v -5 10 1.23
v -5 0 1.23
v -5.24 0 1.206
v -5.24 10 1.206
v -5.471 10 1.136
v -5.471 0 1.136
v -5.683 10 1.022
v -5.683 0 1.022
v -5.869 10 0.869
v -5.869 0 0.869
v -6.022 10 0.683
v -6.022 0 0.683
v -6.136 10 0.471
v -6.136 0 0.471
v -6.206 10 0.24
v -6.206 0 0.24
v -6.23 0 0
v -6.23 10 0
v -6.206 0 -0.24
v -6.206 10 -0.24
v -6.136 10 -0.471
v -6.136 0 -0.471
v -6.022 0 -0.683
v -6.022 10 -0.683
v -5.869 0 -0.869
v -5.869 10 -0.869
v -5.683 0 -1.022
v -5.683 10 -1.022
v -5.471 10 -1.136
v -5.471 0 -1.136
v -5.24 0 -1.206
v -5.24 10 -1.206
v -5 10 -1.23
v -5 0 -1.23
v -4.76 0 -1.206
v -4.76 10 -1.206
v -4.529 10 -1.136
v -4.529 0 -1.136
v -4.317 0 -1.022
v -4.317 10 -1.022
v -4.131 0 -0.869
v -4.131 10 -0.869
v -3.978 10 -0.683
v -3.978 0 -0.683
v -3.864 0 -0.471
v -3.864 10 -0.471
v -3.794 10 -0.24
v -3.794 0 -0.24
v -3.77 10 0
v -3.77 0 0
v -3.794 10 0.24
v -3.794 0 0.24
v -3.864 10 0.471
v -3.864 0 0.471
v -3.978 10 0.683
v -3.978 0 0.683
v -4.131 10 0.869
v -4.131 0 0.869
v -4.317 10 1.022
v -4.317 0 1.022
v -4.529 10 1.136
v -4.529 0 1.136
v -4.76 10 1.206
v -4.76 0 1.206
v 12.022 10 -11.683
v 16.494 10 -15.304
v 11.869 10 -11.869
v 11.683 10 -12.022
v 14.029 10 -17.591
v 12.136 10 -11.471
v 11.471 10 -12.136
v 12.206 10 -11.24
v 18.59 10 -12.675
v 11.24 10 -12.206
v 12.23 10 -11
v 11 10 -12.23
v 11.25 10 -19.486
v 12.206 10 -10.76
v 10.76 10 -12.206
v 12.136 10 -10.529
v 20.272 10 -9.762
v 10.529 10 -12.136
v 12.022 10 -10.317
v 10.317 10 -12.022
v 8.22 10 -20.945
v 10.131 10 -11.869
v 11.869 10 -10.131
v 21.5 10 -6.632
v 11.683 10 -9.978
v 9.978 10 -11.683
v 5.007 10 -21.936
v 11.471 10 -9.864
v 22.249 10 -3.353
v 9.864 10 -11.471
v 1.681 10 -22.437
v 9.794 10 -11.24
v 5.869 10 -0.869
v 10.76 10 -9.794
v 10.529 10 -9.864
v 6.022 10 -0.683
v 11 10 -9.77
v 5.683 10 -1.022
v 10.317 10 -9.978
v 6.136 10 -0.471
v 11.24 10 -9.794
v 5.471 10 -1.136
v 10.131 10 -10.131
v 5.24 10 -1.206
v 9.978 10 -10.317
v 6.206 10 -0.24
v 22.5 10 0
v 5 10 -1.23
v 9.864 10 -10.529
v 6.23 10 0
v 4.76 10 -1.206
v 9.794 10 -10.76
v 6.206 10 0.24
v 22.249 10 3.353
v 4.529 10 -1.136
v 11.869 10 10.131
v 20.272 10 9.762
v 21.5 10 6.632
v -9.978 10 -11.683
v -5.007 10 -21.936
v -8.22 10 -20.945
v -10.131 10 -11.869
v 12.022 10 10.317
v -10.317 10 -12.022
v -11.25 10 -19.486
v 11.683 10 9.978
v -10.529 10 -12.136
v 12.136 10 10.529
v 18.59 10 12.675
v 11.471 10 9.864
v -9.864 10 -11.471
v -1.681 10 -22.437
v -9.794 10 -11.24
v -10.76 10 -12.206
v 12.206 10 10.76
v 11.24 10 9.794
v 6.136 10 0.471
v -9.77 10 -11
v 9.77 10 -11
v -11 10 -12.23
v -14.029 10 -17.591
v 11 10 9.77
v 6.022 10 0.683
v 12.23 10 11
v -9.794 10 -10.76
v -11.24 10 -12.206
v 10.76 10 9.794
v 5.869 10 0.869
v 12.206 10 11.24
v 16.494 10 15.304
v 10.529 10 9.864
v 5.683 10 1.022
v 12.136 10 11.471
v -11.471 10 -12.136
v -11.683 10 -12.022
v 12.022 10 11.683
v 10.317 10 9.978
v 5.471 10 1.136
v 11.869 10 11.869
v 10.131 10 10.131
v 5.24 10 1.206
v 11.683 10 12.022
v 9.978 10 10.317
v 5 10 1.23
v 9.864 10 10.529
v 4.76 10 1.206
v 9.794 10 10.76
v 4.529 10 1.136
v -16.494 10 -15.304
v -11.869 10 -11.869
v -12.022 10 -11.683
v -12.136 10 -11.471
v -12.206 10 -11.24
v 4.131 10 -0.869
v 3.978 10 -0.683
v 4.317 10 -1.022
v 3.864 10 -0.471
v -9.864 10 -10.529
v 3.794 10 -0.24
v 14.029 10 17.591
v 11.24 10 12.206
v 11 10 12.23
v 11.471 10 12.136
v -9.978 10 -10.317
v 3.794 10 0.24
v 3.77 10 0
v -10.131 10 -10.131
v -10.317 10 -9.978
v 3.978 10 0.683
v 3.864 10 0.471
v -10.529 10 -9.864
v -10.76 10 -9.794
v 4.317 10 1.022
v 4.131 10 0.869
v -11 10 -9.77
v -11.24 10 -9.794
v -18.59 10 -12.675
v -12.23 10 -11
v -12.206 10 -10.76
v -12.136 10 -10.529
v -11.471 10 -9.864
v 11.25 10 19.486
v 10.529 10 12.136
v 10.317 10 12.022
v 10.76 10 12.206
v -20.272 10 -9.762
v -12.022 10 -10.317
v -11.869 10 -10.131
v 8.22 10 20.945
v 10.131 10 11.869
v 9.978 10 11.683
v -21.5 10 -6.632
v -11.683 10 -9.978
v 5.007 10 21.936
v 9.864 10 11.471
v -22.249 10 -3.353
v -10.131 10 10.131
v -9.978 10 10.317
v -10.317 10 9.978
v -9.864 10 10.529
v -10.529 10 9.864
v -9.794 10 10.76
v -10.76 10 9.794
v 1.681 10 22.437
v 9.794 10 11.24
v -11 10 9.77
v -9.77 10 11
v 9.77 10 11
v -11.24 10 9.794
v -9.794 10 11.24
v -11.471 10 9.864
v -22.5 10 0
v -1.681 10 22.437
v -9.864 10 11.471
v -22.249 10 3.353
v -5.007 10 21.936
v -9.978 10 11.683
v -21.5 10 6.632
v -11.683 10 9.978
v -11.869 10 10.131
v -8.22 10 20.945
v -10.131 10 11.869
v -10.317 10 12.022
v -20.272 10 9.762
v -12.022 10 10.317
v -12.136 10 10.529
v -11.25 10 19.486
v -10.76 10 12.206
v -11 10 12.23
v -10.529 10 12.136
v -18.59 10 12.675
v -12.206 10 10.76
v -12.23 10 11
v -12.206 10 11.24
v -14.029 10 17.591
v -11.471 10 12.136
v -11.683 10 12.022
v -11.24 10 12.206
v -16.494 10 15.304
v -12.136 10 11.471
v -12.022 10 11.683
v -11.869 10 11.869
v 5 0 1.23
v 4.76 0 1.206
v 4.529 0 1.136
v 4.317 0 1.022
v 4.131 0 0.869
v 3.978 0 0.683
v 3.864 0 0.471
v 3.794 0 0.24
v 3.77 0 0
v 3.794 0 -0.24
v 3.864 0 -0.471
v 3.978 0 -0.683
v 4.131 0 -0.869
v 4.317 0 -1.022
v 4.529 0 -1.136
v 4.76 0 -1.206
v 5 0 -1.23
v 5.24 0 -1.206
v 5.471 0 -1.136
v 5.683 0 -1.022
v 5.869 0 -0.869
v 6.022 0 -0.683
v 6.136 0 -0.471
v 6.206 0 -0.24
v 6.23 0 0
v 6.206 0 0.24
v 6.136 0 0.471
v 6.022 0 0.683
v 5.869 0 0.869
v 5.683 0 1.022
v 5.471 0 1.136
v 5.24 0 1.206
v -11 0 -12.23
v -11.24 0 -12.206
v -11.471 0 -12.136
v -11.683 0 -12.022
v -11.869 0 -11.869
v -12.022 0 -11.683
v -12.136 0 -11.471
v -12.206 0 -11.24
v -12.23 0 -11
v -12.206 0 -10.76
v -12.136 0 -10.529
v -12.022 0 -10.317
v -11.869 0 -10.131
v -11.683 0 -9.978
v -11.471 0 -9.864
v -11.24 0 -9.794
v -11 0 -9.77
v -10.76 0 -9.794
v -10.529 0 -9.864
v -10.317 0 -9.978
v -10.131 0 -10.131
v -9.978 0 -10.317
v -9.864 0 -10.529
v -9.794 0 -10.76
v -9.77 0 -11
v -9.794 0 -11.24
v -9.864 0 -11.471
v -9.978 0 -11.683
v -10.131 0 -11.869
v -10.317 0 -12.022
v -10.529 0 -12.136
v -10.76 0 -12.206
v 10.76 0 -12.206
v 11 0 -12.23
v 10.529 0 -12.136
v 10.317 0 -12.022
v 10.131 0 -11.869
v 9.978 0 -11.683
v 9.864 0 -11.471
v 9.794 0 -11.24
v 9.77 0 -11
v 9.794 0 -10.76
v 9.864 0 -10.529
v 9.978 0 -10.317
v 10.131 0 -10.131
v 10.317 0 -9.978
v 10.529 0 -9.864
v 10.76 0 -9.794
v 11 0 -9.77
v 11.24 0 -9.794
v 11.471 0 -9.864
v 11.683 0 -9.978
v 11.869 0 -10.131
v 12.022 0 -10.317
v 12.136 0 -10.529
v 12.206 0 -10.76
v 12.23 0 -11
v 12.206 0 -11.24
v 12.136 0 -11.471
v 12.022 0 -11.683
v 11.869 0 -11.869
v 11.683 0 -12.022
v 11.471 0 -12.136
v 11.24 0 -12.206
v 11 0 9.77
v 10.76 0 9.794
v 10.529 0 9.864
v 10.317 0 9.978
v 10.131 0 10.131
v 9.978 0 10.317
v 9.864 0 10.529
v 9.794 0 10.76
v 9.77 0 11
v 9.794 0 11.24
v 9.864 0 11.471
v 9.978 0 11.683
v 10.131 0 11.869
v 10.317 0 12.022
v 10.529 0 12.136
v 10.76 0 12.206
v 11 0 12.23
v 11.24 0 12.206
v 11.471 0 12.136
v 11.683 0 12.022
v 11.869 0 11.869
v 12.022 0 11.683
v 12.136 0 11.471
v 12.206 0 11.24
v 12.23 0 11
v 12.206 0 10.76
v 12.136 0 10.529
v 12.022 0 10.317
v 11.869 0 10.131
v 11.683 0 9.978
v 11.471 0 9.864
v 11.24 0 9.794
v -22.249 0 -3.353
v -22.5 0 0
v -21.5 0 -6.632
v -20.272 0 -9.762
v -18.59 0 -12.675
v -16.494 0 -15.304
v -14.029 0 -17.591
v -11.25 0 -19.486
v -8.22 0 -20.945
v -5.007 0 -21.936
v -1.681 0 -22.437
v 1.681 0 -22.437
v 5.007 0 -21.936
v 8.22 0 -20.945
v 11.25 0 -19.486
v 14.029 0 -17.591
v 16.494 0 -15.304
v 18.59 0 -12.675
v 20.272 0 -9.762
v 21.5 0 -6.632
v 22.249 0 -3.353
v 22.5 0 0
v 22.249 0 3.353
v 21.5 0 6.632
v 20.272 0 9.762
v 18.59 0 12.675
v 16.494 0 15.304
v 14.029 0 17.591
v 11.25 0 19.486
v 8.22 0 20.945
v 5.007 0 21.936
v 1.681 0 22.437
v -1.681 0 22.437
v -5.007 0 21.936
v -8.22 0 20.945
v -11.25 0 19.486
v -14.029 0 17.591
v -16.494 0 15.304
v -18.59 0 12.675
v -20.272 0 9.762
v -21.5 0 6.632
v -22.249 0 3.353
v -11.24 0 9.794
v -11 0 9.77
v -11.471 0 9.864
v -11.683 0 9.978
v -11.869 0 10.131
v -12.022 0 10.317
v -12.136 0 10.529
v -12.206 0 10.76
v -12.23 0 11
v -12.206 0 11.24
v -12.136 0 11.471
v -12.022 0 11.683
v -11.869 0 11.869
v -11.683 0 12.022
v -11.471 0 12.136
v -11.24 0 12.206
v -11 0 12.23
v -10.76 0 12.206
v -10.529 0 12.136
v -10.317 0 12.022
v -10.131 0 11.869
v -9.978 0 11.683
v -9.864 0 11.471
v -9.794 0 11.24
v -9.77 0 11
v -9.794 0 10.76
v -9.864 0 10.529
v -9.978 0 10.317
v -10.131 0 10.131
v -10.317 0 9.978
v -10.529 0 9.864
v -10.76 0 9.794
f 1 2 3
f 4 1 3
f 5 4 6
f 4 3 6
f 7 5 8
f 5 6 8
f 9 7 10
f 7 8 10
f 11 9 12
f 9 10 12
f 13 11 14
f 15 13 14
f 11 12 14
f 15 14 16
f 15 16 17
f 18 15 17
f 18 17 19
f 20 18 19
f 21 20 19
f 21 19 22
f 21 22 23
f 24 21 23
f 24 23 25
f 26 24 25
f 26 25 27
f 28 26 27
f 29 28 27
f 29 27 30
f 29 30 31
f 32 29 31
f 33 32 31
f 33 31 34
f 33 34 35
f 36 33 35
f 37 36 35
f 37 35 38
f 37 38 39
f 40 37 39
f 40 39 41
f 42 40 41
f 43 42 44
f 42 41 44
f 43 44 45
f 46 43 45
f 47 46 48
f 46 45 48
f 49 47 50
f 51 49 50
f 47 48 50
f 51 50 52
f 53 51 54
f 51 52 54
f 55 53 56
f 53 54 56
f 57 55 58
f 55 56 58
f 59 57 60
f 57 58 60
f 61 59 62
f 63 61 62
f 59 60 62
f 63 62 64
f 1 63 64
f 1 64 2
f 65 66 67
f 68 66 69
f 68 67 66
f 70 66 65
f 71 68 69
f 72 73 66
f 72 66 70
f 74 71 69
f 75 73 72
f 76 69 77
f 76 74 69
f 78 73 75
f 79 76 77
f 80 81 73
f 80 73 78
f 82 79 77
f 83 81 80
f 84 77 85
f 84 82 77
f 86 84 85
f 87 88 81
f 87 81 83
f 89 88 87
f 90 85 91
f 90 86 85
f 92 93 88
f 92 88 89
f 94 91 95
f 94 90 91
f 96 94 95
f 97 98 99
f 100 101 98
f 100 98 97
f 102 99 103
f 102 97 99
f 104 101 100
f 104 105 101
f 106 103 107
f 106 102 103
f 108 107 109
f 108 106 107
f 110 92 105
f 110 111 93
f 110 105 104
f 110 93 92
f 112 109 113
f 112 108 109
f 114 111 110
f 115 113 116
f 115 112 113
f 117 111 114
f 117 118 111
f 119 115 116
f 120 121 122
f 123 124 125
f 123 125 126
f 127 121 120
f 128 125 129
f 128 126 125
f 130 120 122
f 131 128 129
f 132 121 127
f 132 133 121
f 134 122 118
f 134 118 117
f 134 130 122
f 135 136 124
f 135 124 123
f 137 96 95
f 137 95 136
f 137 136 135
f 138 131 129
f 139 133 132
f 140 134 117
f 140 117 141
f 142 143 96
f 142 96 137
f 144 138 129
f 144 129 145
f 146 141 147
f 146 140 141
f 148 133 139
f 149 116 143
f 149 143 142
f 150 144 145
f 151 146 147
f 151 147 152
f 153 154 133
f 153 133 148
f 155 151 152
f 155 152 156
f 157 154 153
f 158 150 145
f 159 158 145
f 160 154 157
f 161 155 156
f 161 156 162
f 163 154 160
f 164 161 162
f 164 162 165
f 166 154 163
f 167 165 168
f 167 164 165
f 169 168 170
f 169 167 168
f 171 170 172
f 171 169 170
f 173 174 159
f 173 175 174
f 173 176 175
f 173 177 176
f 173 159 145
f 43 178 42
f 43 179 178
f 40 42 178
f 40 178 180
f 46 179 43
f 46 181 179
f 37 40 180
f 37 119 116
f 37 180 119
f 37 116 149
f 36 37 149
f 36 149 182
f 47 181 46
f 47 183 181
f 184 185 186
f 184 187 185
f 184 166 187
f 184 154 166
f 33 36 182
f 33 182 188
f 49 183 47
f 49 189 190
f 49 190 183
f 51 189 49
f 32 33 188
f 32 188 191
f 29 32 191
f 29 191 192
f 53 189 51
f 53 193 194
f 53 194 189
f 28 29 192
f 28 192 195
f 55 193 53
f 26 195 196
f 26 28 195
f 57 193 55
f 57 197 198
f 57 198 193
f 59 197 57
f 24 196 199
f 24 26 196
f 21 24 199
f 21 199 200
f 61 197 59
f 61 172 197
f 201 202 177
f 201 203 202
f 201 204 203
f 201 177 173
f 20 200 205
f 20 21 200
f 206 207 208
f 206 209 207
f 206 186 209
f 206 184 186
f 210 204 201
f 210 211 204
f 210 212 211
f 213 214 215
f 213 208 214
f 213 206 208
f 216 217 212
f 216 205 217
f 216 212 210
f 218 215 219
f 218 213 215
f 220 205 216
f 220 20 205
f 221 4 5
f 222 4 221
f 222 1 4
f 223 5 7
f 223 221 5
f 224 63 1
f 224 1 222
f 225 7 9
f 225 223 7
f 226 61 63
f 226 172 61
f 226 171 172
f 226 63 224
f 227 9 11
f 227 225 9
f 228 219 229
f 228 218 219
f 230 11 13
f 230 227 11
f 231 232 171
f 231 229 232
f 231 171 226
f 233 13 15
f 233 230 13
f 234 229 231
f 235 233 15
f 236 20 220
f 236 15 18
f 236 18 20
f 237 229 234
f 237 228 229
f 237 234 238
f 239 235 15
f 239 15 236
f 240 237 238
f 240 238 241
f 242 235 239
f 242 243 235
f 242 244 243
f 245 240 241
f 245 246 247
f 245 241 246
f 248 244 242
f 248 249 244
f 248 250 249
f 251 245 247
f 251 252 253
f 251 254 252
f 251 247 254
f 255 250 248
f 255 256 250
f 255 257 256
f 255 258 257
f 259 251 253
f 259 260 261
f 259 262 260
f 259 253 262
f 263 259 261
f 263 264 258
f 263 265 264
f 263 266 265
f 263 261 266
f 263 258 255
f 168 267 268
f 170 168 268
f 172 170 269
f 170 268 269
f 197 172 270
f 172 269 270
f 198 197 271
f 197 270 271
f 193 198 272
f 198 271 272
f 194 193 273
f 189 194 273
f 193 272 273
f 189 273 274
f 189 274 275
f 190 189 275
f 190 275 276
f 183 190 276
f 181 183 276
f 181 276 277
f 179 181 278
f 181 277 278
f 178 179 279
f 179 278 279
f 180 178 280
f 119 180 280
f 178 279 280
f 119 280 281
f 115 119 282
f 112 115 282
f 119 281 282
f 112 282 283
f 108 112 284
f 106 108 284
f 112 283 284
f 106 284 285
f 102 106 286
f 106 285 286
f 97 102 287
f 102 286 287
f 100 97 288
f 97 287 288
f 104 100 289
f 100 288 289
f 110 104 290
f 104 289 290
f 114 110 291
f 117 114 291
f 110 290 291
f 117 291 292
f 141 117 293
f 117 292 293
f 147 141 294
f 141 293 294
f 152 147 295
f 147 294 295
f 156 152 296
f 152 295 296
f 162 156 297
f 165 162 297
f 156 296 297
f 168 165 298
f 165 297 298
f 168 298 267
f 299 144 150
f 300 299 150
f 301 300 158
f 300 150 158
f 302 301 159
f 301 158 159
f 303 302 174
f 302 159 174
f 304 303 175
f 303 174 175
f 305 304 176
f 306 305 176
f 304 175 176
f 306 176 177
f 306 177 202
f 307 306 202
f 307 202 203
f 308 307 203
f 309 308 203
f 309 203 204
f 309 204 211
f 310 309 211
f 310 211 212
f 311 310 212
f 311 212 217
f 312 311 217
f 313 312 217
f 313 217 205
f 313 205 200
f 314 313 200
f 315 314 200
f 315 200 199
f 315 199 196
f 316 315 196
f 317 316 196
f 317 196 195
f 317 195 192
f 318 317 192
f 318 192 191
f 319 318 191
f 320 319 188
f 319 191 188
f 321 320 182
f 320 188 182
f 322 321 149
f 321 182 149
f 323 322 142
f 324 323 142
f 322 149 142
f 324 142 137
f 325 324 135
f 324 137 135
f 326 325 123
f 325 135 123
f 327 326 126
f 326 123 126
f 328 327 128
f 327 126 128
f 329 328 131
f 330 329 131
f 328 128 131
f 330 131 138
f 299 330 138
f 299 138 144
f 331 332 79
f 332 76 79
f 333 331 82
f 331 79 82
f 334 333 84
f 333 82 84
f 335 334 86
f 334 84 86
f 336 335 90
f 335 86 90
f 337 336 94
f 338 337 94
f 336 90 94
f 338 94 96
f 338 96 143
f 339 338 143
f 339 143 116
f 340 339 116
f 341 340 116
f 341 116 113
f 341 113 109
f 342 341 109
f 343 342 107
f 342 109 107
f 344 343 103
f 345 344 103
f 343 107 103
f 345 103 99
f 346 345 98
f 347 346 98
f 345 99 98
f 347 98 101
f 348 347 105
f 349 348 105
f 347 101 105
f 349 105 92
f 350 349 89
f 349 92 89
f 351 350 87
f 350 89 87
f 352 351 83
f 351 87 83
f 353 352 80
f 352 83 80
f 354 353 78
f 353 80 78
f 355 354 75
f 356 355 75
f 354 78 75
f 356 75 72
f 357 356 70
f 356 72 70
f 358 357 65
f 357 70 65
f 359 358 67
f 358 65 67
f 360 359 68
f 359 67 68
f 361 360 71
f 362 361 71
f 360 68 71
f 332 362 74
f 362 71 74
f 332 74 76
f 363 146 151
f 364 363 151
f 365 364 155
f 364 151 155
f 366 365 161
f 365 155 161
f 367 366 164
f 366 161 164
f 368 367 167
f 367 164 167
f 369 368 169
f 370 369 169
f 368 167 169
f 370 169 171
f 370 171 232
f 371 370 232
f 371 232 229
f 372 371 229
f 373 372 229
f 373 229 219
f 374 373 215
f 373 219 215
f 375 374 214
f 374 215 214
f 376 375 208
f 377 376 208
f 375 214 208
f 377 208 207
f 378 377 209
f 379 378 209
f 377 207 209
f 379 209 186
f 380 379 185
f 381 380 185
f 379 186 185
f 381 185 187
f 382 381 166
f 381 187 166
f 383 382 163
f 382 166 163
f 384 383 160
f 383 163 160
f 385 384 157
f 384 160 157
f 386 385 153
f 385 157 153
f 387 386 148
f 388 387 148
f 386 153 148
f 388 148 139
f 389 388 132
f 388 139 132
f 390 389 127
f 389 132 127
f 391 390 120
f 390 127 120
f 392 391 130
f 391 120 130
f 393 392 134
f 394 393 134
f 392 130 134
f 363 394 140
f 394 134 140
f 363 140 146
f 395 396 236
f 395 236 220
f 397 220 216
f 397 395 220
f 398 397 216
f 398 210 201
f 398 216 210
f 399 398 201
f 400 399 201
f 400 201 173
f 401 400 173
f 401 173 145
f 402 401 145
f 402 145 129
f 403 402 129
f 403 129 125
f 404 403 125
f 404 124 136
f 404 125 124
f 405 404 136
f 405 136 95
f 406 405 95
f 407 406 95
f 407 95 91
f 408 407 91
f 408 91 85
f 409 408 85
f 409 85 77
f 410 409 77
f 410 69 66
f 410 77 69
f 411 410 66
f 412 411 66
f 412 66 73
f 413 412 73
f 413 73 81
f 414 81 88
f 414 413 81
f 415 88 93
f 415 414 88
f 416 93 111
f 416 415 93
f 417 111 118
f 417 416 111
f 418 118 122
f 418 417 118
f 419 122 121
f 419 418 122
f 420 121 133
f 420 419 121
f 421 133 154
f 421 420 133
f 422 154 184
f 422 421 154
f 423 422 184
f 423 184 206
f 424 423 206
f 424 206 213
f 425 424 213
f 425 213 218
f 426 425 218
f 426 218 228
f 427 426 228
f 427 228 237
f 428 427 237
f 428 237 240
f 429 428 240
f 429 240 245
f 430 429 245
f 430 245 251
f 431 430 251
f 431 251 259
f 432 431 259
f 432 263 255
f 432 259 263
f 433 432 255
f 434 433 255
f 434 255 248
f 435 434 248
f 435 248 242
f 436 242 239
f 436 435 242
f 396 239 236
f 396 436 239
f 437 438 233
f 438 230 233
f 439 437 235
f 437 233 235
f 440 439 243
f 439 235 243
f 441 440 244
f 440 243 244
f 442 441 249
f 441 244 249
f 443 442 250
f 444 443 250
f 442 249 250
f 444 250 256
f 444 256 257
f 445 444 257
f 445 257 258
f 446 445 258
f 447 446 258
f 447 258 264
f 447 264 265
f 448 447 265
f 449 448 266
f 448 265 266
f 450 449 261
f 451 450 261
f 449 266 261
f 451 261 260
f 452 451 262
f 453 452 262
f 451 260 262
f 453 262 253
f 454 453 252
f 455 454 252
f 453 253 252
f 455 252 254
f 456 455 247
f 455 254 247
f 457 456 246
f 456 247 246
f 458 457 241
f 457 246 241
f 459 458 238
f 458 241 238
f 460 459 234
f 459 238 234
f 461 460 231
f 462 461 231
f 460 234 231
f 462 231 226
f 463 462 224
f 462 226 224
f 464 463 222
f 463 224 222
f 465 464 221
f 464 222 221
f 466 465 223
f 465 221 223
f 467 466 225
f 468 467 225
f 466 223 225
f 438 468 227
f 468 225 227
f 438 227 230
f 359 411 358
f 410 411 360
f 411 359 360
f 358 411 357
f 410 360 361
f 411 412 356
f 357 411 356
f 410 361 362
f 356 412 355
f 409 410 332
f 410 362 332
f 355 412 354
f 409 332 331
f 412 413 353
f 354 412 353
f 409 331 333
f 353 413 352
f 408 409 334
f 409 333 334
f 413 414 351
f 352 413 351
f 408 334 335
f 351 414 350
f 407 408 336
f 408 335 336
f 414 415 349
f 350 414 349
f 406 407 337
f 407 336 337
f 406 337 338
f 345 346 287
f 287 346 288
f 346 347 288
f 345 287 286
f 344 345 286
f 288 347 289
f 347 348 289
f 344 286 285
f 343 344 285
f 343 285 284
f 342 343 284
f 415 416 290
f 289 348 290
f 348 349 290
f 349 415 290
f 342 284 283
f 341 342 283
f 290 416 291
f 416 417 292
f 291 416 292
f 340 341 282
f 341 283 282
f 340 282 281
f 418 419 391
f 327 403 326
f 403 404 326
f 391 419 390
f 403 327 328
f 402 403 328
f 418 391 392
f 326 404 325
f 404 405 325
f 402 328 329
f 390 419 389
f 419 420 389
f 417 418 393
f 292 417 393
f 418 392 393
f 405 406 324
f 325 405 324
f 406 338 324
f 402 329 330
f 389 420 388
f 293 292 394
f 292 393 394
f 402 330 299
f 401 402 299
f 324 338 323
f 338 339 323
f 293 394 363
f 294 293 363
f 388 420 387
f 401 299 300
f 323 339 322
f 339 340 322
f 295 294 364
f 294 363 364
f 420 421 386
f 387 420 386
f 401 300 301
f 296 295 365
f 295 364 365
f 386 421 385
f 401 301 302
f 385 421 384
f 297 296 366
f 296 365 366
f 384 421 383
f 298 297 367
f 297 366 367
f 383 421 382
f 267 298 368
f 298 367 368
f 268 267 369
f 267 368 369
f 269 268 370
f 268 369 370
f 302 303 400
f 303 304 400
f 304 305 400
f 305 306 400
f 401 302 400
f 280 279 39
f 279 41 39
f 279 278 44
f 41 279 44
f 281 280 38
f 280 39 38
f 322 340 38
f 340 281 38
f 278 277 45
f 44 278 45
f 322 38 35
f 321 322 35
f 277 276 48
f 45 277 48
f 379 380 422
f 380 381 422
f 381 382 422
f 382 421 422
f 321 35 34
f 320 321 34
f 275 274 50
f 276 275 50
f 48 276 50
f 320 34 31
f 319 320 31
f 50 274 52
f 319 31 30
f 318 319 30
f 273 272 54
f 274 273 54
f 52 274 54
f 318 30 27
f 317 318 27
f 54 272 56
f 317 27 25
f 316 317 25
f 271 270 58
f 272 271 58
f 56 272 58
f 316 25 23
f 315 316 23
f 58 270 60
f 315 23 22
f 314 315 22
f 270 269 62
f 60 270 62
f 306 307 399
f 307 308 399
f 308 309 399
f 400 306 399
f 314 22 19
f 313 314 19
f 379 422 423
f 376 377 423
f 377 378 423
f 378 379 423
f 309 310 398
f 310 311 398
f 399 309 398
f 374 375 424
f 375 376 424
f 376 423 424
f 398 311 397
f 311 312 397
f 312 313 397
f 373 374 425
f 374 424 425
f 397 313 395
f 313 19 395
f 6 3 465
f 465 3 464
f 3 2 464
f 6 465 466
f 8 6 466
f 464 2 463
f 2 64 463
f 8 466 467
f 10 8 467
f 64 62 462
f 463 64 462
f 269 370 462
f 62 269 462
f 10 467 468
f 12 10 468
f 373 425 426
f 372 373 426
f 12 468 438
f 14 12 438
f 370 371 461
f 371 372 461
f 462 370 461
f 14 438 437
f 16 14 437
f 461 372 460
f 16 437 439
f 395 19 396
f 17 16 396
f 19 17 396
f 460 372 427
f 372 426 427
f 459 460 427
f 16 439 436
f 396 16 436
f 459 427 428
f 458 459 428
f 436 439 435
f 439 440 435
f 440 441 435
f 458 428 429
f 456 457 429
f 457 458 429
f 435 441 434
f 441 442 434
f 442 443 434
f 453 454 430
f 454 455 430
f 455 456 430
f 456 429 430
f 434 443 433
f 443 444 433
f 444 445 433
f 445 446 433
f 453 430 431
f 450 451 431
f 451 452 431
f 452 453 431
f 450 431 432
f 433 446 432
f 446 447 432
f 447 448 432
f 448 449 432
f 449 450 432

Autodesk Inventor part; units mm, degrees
ref_plane "YZ Plane" through (0, 0, 0) normal (1, 0, 0) x (0, 1, 0)
ref_plane "XZ Plane" through (0, 0, 0) normal (0, 1, 0) x (-1, 0, 0)
ref_plane "XY Plane" through (0, 0, 0) normal (0, 0, 1) x (1, 0, 0)
sketch "Эскиз1" plane through (0, 0, 0) normal (0, 1, 0) x (-1, 0, 0)
  circle A0 centre (0, 0) radius 22.5
  dimension "d0" = 45
extrude "Выдавливание1" add sketch "Эскиз1" along normal blind 10
sketch "Эскиз2" plane through (0, 10, 0) normal (0, 1, 0) x (1, 0, 0)
  line L0 (0, 0) -> (-5, 0)
  line L1 (-5, 0) -> (5, 0)
  dimension "d3" = 5
  dimension "d4" = 10
hole "Отверстие1" at (-5, 10, 0) at (5, 10, 0) direction (0, -1, 0) diameter 2.459 end through all thread size "M3x0.5" class "6H" standard "ISO Metric profile"
sketch "Эскиз3" plane through (0, 10, 0) normal (0, 1, 0) x (1, 0, 0)
  point P0 (0, 0)
sketch "Эскиз4" plane through (0, 0, 0) normal (0, -1, 0) x (1, 0, 0)
  line L0 (15.5563, 15.5563) -> (-15.5563, 15.5563)
  line L1 (-15.5563, 15.5563) -> (-15.5563, -15.5563)
  line L2 (-15.5563, -15.5563) -> (15.5563, -15.5563)
  line L3 (15.5563, -15.5563) -> (15.5563, 15.5563)
  line L4 (15.5563, 15.5563) -> (-15.5563, -15.5563)
  line L5 (15.5563, -15.5563) -> (-15.5563, 15.5563)
  line L6 (-11, 11) -> (11, 11)
  line L7 (11, 11) -> (11, -11)
  line L8 (11, -11) -> (-11, -11)
  line L9 (-11, -11) -> (-11, 11)
  point P0 (0, 0)
  dimension "d23" = 22
hole "Отверстие2" at (11, 0, -11) at (-11, 0, 11) at (11, 0, 11) at (-11, 0, -11) direction (0, 1, 0) diameter 2.459 end through all thread size "M3x0.5" class "6H" standard "ISO Metric profile"
properties part number "Диск (маховик, вал)"
